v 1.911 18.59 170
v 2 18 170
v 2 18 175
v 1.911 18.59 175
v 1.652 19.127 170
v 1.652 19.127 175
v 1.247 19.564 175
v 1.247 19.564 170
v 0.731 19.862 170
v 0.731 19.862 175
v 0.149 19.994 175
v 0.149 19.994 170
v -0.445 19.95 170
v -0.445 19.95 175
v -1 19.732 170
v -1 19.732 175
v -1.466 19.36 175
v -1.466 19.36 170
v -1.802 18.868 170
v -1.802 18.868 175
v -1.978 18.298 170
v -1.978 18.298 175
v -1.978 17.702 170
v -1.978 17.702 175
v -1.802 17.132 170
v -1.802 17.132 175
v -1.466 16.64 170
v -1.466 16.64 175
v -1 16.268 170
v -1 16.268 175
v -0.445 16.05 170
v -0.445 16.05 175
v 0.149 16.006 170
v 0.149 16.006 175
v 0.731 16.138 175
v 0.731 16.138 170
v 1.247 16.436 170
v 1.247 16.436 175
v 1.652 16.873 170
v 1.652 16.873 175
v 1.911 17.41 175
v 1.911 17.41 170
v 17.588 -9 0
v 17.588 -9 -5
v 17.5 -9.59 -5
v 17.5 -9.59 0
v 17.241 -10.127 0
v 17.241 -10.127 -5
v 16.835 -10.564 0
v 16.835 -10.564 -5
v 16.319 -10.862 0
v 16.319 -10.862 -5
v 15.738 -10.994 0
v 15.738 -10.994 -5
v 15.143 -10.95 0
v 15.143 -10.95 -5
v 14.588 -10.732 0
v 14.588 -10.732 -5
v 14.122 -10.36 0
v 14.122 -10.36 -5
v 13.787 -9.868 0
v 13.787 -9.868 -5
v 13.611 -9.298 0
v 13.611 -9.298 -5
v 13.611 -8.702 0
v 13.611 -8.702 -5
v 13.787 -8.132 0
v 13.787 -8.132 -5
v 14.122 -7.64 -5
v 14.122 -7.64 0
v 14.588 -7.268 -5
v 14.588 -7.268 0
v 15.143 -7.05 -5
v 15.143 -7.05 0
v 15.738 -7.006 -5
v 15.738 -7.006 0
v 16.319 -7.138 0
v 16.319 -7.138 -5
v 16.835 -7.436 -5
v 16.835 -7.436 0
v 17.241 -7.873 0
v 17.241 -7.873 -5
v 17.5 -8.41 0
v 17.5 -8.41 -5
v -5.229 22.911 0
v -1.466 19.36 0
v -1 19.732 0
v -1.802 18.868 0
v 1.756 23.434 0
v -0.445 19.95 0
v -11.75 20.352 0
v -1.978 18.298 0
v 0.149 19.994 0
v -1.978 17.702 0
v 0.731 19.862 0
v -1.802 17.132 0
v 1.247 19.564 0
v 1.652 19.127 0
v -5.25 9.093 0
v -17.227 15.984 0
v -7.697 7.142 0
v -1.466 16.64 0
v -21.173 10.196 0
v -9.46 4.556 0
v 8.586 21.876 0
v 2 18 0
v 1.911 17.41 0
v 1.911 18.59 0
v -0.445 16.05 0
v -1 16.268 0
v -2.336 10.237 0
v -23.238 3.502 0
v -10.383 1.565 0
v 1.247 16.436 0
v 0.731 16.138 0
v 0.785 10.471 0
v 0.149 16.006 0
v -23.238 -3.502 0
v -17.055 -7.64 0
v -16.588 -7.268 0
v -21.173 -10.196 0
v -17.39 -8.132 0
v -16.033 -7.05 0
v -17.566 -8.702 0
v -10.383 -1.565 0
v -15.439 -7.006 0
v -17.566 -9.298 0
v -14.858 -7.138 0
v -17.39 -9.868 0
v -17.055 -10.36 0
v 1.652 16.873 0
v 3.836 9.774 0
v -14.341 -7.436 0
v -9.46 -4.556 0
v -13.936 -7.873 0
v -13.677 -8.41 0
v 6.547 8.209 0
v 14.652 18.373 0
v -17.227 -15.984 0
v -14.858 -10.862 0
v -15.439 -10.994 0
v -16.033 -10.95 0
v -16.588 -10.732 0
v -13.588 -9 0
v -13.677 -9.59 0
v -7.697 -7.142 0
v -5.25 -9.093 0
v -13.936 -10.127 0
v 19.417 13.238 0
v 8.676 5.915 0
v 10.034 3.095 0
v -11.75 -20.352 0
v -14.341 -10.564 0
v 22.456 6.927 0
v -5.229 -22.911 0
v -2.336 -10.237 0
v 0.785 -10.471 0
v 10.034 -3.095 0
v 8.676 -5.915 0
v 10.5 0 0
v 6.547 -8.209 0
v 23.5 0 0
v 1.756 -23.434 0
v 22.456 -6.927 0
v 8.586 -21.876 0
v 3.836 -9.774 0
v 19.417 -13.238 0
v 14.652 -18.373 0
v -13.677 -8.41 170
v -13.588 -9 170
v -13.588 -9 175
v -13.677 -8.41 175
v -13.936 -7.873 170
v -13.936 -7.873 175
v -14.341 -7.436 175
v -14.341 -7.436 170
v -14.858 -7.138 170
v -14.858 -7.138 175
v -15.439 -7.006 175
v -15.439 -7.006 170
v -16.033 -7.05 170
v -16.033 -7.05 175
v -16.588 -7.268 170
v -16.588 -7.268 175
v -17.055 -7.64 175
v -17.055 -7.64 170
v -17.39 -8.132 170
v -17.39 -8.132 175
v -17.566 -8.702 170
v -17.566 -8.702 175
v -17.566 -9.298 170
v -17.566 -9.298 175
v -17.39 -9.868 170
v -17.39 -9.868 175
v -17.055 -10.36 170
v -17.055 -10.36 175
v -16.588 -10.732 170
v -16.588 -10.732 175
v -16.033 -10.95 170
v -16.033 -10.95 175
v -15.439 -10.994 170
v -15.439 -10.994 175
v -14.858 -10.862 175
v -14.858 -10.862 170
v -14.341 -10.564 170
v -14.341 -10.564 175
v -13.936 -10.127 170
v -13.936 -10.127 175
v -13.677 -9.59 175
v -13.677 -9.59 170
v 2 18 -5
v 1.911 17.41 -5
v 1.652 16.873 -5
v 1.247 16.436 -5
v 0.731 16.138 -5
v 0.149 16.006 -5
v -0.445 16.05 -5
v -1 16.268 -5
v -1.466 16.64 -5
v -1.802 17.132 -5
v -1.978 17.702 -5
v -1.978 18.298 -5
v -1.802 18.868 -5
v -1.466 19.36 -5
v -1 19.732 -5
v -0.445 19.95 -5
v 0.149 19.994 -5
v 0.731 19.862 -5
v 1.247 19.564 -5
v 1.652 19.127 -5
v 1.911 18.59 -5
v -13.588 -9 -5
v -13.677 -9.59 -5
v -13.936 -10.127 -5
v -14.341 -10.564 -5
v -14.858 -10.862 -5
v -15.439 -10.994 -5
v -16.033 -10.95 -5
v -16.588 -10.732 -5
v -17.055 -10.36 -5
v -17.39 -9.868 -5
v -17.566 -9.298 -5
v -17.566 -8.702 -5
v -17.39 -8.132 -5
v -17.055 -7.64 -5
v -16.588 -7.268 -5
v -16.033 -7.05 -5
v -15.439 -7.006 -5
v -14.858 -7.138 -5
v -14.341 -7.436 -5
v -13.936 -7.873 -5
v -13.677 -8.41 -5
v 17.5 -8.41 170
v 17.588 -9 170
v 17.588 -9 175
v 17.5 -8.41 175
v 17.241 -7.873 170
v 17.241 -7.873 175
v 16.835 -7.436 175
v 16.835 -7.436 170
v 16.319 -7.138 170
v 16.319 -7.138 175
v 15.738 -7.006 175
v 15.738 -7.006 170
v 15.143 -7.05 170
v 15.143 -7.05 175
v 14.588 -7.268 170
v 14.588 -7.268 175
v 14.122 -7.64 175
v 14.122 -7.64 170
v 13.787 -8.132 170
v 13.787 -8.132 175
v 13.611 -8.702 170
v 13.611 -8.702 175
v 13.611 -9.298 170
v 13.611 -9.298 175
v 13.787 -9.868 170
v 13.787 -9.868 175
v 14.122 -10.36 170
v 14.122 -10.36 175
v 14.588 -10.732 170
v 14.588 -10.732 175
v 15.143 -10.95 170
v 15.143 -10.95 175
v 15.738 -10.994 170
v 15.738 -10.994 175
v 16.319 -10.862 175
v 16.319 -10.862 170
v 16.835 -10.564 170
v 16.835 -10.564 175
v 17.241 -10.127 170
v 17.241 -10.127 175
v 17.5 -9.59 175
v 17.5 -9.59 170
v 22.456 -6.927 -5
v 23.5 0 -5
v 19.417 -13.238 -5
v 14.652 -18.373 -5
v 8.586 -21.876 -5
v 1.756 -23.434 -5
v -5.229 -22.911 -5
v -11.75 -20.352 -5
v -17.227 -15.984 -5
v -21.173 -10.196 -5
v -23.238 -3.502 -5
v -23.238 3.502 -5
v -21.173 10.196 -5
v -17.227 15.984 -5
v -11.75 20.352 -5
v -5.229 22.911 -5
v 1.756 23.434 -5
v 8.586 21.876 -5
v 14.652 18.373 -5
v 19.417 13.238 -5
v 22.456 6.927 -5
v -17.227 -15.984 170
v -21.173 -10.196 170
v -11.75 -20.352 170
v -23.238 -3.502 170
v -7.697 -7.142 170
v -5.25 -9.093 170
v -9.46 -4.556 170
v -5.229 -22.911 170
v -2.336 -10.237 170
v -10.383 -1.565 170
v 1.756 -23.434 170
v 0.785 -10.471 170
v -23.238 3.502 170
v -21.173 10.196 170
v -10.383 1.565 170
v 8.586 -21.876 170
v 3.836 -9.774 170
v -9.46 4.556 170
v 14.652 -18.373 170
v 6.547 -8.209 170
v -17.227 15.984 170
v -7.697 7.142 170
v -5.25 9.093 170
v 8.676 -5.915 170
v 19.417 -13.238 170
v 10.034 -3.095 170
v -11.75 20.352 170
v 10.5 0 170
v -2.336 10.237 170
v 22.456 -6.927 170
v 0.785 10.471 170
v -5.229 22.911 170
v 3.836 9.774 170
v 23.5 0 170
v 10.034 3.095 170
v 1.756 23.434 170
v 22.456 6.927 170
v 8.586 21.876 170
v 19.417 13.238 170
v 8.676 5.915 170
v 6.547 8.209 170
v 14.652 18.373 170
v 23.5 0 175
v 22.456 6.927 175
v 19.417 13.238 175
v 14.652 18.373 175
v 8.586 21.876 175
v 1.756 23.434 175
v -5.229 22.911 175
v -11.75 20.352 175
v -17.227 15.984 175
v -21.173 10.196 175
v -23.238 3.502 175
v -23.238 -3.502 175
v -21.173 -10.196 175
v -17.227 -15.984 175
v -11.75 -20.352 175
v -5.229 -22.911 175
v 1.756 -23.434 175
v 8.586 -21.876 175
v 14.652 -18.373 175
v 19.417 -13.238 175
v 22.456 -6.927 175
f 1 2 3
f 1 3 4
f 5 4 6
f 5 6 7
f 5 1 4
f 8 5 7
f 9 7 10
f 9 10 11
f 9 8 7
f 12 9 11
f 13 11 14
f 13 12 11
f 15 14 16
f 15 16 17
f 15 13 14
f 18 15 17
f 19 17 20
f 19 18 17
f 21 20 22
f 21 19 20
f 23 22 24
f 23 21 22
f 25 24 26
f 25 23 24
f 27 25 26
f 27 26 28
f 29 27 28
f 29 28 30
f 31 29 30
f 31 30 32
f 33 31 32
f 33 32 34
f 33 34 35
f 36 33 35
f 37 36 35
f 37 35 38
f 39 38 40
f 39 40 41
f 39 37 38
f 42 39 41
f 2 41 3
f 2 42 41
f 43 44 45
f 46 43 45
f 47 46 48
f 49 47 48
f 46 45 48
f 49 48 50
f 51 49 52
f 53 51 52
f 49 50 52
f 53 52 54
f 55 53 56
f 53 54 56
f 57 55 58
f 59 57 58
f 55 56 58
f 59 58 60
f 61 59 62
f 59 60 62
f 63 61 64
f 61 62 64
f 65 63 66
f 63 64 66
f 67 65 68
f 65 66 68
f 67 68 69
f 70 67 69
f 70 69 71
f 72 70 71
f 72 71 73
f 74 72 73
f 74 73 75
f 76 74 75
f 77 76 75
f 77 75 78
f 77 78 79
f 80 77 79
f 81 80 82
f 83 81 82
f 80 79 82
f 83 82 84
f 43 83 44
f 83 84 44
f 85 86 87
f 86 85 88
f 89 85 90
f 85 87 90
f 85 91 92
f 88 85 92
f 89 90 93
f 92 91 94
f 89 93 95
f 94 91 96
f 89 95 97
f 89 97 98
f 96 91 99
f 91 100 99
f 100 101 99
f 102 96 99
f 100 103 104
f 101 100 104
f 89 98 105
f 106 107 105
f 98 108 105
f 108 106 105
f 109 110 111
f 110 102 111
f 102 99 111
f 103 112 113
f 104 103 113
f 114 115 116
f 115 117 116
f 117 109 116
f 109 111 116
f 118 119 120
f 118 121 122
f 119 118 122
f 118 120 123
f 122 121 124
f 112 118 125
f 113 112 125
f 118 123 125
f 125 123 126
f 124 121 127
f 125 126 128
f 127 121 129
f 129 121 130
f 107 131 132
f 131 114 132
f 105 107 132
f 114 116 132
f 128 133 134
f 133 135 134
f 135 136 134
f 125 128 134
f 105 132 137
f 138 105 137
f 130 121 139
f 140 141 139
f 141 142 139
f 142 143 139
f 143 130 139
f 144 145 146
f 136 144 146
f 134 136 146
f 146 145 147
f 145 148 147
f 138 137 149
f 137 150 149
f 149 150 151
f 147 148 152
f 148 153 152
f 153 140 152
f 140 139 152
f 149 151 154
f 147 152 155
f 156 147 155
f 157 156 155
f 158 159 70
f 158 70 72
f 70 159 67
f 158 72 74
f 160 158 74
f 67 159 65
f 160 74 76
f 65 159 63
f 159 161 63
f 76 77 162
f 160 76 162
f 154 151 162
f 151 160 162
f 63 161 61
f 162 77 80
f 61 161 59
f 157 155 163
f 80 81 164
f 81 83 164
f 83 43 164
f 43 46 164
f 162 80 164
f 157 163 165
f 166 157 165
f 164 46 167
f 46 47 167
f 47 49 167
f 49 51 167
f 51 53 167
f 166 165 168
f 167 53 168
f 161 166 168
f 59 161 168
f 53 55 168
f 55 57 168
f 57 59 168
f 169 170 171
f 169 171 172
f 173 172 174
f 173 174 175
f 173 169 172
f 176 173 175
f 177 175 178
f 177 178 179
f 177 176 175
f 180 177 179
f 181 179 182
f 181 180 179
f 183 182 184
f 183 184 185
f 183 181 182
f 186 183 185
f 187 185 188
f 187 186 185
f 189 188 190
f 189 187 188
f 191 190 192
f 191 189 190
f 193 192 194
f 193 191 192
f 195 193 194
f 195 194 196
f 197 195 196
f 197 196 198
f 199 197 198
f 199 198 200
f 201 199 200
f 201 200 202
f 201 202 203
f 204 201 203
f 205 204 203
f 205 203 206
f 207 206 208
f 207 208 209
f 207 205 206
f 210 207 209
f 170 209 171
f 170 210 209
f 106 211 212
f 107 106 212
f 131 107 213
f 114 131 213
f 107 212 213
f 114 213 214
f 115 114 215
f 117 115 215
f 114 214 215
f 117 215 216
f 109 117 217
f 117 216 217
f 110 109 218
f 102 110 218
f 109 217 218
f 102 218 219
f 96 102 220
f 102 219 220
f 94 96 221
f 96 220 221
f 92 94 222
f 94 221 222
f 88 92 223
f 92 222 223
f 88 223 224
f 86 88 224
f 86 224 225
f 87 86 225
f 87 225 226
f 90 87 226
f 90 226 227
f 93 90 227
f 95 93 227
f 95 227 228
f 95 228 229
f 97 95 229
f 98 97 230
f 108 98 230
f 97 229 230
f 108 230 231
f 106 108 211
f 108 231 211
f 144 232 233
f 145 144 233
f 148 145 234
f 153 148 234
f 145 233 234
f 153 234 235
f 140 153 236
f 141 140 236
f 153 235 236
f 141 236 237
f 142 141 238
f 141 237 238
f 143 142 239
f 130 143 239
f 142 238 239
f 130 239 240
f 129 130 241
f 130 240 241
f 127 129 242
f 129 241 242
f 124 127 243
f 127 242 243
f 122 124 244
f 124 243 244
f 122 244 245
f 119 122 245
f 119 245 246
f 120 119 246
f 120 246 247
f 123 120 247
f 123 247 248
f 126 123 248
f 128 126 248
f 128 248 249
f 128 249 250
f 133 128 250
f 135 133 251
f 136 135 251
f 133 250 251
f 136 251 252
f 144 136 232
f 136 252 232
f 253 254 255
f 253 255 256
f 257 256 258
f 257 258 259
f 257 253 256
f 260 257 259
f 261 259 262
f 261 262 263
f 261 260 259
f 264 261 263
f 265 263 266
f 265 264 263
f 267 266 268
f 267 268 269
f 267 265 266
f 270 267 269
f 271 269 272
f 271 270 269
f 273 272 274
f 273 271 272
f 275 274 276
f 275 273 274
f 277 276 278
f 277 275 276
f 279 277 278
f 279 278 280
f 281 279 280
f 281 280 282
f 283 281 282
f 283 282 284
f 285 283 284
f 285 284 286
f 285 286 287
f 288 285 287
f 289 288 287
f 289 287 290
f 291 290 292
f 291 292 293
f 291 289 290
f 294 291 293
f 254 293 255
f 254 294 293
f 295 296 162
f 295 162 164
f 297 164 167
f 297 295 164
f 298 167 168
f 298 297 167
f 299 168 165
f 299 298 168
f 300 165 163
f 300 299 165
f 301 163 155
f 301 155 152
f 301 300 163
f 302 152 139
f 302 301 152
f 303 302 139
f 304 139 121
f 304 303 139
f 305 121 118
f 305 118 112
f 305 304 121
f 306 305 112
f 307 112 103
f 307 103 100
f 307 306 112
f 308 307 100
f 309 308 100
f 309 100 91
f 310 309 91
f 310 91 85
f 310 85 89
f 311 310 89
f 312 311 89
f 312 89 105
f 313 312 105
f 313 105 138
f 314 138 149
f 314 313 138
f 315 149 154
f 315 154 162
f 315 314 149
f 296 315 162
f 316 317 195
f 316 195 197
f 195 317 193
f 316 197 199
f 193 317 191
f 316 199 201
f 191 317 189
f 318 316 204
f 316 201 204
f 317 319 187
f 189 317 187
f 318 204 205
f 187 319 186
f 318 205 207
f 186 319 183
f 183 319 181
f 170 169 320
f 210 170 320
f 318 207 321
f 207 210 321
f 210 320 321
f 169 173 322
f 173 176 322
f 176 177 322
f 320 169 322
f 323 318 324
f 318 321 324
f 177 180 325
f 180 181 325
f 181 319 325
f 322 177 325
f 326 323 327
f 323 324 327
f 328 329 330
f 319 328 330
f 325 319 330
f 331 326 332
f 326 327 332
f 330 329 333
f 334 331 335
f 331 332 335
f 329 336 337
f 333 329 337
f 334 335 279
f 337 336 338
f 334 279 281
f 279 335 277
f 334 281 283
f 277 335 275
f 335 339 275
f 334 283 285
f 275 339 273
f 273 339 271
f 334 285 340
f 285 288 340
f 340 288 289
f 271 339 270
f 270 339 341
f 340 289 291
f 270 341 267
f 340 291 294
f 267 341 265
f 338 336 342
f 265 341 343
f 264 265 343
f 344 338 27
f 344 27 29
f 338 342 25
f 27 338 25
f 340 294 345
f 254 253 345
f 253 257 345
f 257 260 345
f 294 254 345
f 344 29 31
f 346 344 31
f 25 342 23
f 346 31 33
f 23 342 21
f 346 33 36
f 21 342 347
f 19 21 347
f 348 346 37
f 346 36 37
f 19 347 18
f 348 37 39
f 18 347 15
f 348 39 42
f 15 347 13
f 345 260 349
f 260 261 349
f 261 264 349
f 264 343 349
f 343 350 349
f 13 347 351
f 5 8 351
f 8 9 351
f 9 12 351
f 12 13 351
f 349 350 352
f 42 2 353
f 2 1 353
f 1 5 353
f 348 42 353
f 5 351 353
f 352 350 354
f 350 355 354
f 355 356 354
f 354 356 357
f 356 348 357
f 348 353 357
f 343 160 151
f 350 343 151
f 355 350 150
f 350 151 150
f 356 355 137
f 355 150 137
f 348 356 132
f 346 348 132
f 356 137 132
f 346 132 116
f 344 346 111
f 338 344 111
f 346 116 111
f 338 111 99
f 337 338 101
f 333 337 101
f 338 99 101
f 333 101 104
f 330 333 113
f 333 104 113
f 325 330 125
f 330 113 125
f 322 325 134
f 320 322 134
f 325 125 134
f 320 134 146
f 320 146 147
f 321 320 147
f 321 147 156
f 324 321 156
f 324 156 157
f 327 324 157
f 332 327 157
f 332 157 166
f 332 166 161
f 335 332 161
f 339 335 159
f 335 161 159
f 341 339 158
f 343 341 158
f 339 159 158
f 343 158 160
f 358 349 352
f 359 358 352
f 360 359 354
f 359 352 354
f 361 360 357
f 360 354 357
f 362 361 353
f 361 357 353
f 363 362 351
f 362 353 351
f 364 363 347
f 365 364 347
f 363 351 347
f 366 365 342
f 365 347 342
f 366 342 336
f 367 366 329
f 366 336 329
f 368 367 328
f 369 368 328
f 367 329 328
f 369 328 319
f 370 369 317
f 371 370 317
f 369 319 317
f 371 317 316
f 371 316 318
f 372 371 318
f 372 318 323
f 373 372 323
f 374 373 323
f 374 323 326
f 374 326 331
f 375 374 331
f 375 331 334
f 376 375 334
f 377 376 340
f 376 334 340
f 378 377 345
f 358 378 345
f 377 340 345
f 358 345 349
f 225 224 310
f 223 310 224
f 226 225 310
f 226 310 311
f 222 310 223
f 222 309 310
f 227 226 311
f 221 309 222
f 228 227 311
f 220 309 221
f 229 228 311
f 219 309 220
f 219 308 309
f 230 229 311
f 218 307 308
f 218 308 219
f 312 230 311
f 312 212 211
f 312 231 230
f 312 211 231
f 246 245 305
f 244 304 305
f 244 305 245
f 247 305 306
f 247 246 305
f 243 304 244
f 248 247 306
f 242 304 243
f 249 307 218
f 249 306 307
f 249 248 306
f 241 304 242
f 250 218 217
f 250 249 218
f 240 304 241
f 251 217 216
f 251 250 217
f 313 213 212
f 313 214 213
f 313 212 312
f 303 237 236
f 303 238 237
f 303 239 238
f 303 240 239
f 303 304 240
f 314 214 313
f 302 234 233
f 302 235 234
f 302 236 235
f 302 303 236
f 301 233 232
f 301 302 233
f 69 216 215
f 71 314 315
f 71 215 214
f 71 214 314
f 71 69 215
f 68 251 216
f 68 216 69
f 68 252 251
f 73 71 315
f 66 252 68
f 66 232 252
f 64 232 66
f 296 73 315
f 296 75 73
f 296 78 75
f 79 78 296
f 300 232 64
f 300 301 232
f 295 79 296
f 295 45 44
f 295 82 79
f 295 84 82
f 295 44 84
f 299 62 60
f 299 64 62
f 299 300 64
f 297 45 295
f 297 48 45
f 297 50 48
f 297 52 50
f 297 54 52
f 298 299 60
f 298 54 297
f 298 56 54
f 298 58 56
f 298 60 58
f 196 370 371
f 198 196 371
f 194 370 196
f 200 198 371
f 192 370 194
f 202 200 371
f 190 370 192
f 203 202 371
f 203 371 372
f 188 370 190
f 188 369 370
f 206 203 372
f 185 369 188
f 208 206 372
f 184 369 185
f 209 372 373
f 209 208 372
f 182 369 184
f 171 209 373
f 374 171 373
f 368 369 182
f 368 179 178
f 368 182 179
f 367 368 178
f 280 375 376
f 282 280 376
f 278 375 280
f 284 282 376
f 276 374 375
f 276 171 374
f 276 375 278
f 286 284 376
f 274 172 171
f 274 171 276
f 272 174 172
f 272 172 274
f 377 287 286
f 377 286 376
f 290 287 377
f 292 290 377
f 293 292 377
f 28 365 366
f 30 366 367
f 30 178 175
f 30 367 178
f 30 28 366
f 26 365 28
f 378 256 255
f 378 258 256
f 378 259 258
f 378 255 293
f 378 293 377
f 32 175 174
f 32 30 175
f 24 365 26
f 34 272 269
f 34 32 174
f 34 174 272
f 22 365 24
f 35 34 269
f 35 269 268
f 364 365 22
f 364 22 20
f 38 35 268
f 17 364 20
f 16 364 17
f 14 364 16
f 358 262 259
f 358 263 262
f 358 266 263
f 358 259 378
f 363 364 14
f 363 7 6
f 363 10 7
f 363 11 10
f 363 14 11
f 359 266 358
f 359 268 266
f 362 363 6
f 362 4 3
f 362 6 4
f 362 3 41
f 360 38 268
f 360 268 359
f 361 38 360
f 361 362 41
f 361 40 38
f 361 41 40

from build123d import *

# Parameters (mm, degrees)
SKETCH_1_R      = 10.5
EXTRUDE_1_DEPTH = 170
SKETCH_2_R      = 23.5
SKETCH_2_R_2    = 2
EXTRUDE_2_DEPTH = 5
EXTRUDE_START   = 5
SKETCH_3_R      = 23.5
SKETCH_3_R_2    = 2
EXTRUDE_3_DEPTH = 5


with BuildPart() as part:
    # 草图1 → 凸台-拉伸1 (new body)
    with BuildSketch(Plane.XY):
        Circle(SKETCH_1_R)
    extrude(amount=EXTRUDE_1_DEPTH)

    # 草图2 → 凸台-拉伸2 (add)
    with BuildSketch(Plane.XY.offset(170)):
        Circle(SKETCH_2_R)
        with Locations((0, 18)):
            Circle(SKETCH_2_R_2, mode=Mode.SUBTRACT)
        with Locations((-15.588457268, -9)):
            Circle(SKETCH_2_R_2, mode=Mode.SUBTRACT)
        with Locations((15.588457268, -9)):
            Circle(SKETCH_2_R_2, mode=Mode.SUBTRACT)
    extrude(amount=EXTRUDE_2_DEPTH)

    # 草图3 → 凸台-拉伸3 (add)
    with BuildSketch(Plane(origin=(0, 0, 0), x_dir=(-1, 0, 0), z_dir=(0, 0, -1)).offset(EXTRUDE_START)):
        with Locations(Location((0, 0, 0), (0, 0, 180))):
            Circle(SKETCH_3_R)
        with Locations(Location((0, 18, 0), (0, 0, 180))):
            Circle(SKETCH_3_R_2, mode=Mode.SUBTRACT)
        with Locations(Location((15.588457268, -9, 0), (0, 0, 180))):
            Circle(SKETCH_3_R_2, mode=Mode.SUBTRACT)
        with Locations(Location((-15.588457268, -9, 0), (0, 0, 180))):
            Circle(SKETCH_3_R_2, mode=Mode.SUBTRACT)
    extrude(amount=-EXTRUDE_3_DEPTH)


solid = part.part
